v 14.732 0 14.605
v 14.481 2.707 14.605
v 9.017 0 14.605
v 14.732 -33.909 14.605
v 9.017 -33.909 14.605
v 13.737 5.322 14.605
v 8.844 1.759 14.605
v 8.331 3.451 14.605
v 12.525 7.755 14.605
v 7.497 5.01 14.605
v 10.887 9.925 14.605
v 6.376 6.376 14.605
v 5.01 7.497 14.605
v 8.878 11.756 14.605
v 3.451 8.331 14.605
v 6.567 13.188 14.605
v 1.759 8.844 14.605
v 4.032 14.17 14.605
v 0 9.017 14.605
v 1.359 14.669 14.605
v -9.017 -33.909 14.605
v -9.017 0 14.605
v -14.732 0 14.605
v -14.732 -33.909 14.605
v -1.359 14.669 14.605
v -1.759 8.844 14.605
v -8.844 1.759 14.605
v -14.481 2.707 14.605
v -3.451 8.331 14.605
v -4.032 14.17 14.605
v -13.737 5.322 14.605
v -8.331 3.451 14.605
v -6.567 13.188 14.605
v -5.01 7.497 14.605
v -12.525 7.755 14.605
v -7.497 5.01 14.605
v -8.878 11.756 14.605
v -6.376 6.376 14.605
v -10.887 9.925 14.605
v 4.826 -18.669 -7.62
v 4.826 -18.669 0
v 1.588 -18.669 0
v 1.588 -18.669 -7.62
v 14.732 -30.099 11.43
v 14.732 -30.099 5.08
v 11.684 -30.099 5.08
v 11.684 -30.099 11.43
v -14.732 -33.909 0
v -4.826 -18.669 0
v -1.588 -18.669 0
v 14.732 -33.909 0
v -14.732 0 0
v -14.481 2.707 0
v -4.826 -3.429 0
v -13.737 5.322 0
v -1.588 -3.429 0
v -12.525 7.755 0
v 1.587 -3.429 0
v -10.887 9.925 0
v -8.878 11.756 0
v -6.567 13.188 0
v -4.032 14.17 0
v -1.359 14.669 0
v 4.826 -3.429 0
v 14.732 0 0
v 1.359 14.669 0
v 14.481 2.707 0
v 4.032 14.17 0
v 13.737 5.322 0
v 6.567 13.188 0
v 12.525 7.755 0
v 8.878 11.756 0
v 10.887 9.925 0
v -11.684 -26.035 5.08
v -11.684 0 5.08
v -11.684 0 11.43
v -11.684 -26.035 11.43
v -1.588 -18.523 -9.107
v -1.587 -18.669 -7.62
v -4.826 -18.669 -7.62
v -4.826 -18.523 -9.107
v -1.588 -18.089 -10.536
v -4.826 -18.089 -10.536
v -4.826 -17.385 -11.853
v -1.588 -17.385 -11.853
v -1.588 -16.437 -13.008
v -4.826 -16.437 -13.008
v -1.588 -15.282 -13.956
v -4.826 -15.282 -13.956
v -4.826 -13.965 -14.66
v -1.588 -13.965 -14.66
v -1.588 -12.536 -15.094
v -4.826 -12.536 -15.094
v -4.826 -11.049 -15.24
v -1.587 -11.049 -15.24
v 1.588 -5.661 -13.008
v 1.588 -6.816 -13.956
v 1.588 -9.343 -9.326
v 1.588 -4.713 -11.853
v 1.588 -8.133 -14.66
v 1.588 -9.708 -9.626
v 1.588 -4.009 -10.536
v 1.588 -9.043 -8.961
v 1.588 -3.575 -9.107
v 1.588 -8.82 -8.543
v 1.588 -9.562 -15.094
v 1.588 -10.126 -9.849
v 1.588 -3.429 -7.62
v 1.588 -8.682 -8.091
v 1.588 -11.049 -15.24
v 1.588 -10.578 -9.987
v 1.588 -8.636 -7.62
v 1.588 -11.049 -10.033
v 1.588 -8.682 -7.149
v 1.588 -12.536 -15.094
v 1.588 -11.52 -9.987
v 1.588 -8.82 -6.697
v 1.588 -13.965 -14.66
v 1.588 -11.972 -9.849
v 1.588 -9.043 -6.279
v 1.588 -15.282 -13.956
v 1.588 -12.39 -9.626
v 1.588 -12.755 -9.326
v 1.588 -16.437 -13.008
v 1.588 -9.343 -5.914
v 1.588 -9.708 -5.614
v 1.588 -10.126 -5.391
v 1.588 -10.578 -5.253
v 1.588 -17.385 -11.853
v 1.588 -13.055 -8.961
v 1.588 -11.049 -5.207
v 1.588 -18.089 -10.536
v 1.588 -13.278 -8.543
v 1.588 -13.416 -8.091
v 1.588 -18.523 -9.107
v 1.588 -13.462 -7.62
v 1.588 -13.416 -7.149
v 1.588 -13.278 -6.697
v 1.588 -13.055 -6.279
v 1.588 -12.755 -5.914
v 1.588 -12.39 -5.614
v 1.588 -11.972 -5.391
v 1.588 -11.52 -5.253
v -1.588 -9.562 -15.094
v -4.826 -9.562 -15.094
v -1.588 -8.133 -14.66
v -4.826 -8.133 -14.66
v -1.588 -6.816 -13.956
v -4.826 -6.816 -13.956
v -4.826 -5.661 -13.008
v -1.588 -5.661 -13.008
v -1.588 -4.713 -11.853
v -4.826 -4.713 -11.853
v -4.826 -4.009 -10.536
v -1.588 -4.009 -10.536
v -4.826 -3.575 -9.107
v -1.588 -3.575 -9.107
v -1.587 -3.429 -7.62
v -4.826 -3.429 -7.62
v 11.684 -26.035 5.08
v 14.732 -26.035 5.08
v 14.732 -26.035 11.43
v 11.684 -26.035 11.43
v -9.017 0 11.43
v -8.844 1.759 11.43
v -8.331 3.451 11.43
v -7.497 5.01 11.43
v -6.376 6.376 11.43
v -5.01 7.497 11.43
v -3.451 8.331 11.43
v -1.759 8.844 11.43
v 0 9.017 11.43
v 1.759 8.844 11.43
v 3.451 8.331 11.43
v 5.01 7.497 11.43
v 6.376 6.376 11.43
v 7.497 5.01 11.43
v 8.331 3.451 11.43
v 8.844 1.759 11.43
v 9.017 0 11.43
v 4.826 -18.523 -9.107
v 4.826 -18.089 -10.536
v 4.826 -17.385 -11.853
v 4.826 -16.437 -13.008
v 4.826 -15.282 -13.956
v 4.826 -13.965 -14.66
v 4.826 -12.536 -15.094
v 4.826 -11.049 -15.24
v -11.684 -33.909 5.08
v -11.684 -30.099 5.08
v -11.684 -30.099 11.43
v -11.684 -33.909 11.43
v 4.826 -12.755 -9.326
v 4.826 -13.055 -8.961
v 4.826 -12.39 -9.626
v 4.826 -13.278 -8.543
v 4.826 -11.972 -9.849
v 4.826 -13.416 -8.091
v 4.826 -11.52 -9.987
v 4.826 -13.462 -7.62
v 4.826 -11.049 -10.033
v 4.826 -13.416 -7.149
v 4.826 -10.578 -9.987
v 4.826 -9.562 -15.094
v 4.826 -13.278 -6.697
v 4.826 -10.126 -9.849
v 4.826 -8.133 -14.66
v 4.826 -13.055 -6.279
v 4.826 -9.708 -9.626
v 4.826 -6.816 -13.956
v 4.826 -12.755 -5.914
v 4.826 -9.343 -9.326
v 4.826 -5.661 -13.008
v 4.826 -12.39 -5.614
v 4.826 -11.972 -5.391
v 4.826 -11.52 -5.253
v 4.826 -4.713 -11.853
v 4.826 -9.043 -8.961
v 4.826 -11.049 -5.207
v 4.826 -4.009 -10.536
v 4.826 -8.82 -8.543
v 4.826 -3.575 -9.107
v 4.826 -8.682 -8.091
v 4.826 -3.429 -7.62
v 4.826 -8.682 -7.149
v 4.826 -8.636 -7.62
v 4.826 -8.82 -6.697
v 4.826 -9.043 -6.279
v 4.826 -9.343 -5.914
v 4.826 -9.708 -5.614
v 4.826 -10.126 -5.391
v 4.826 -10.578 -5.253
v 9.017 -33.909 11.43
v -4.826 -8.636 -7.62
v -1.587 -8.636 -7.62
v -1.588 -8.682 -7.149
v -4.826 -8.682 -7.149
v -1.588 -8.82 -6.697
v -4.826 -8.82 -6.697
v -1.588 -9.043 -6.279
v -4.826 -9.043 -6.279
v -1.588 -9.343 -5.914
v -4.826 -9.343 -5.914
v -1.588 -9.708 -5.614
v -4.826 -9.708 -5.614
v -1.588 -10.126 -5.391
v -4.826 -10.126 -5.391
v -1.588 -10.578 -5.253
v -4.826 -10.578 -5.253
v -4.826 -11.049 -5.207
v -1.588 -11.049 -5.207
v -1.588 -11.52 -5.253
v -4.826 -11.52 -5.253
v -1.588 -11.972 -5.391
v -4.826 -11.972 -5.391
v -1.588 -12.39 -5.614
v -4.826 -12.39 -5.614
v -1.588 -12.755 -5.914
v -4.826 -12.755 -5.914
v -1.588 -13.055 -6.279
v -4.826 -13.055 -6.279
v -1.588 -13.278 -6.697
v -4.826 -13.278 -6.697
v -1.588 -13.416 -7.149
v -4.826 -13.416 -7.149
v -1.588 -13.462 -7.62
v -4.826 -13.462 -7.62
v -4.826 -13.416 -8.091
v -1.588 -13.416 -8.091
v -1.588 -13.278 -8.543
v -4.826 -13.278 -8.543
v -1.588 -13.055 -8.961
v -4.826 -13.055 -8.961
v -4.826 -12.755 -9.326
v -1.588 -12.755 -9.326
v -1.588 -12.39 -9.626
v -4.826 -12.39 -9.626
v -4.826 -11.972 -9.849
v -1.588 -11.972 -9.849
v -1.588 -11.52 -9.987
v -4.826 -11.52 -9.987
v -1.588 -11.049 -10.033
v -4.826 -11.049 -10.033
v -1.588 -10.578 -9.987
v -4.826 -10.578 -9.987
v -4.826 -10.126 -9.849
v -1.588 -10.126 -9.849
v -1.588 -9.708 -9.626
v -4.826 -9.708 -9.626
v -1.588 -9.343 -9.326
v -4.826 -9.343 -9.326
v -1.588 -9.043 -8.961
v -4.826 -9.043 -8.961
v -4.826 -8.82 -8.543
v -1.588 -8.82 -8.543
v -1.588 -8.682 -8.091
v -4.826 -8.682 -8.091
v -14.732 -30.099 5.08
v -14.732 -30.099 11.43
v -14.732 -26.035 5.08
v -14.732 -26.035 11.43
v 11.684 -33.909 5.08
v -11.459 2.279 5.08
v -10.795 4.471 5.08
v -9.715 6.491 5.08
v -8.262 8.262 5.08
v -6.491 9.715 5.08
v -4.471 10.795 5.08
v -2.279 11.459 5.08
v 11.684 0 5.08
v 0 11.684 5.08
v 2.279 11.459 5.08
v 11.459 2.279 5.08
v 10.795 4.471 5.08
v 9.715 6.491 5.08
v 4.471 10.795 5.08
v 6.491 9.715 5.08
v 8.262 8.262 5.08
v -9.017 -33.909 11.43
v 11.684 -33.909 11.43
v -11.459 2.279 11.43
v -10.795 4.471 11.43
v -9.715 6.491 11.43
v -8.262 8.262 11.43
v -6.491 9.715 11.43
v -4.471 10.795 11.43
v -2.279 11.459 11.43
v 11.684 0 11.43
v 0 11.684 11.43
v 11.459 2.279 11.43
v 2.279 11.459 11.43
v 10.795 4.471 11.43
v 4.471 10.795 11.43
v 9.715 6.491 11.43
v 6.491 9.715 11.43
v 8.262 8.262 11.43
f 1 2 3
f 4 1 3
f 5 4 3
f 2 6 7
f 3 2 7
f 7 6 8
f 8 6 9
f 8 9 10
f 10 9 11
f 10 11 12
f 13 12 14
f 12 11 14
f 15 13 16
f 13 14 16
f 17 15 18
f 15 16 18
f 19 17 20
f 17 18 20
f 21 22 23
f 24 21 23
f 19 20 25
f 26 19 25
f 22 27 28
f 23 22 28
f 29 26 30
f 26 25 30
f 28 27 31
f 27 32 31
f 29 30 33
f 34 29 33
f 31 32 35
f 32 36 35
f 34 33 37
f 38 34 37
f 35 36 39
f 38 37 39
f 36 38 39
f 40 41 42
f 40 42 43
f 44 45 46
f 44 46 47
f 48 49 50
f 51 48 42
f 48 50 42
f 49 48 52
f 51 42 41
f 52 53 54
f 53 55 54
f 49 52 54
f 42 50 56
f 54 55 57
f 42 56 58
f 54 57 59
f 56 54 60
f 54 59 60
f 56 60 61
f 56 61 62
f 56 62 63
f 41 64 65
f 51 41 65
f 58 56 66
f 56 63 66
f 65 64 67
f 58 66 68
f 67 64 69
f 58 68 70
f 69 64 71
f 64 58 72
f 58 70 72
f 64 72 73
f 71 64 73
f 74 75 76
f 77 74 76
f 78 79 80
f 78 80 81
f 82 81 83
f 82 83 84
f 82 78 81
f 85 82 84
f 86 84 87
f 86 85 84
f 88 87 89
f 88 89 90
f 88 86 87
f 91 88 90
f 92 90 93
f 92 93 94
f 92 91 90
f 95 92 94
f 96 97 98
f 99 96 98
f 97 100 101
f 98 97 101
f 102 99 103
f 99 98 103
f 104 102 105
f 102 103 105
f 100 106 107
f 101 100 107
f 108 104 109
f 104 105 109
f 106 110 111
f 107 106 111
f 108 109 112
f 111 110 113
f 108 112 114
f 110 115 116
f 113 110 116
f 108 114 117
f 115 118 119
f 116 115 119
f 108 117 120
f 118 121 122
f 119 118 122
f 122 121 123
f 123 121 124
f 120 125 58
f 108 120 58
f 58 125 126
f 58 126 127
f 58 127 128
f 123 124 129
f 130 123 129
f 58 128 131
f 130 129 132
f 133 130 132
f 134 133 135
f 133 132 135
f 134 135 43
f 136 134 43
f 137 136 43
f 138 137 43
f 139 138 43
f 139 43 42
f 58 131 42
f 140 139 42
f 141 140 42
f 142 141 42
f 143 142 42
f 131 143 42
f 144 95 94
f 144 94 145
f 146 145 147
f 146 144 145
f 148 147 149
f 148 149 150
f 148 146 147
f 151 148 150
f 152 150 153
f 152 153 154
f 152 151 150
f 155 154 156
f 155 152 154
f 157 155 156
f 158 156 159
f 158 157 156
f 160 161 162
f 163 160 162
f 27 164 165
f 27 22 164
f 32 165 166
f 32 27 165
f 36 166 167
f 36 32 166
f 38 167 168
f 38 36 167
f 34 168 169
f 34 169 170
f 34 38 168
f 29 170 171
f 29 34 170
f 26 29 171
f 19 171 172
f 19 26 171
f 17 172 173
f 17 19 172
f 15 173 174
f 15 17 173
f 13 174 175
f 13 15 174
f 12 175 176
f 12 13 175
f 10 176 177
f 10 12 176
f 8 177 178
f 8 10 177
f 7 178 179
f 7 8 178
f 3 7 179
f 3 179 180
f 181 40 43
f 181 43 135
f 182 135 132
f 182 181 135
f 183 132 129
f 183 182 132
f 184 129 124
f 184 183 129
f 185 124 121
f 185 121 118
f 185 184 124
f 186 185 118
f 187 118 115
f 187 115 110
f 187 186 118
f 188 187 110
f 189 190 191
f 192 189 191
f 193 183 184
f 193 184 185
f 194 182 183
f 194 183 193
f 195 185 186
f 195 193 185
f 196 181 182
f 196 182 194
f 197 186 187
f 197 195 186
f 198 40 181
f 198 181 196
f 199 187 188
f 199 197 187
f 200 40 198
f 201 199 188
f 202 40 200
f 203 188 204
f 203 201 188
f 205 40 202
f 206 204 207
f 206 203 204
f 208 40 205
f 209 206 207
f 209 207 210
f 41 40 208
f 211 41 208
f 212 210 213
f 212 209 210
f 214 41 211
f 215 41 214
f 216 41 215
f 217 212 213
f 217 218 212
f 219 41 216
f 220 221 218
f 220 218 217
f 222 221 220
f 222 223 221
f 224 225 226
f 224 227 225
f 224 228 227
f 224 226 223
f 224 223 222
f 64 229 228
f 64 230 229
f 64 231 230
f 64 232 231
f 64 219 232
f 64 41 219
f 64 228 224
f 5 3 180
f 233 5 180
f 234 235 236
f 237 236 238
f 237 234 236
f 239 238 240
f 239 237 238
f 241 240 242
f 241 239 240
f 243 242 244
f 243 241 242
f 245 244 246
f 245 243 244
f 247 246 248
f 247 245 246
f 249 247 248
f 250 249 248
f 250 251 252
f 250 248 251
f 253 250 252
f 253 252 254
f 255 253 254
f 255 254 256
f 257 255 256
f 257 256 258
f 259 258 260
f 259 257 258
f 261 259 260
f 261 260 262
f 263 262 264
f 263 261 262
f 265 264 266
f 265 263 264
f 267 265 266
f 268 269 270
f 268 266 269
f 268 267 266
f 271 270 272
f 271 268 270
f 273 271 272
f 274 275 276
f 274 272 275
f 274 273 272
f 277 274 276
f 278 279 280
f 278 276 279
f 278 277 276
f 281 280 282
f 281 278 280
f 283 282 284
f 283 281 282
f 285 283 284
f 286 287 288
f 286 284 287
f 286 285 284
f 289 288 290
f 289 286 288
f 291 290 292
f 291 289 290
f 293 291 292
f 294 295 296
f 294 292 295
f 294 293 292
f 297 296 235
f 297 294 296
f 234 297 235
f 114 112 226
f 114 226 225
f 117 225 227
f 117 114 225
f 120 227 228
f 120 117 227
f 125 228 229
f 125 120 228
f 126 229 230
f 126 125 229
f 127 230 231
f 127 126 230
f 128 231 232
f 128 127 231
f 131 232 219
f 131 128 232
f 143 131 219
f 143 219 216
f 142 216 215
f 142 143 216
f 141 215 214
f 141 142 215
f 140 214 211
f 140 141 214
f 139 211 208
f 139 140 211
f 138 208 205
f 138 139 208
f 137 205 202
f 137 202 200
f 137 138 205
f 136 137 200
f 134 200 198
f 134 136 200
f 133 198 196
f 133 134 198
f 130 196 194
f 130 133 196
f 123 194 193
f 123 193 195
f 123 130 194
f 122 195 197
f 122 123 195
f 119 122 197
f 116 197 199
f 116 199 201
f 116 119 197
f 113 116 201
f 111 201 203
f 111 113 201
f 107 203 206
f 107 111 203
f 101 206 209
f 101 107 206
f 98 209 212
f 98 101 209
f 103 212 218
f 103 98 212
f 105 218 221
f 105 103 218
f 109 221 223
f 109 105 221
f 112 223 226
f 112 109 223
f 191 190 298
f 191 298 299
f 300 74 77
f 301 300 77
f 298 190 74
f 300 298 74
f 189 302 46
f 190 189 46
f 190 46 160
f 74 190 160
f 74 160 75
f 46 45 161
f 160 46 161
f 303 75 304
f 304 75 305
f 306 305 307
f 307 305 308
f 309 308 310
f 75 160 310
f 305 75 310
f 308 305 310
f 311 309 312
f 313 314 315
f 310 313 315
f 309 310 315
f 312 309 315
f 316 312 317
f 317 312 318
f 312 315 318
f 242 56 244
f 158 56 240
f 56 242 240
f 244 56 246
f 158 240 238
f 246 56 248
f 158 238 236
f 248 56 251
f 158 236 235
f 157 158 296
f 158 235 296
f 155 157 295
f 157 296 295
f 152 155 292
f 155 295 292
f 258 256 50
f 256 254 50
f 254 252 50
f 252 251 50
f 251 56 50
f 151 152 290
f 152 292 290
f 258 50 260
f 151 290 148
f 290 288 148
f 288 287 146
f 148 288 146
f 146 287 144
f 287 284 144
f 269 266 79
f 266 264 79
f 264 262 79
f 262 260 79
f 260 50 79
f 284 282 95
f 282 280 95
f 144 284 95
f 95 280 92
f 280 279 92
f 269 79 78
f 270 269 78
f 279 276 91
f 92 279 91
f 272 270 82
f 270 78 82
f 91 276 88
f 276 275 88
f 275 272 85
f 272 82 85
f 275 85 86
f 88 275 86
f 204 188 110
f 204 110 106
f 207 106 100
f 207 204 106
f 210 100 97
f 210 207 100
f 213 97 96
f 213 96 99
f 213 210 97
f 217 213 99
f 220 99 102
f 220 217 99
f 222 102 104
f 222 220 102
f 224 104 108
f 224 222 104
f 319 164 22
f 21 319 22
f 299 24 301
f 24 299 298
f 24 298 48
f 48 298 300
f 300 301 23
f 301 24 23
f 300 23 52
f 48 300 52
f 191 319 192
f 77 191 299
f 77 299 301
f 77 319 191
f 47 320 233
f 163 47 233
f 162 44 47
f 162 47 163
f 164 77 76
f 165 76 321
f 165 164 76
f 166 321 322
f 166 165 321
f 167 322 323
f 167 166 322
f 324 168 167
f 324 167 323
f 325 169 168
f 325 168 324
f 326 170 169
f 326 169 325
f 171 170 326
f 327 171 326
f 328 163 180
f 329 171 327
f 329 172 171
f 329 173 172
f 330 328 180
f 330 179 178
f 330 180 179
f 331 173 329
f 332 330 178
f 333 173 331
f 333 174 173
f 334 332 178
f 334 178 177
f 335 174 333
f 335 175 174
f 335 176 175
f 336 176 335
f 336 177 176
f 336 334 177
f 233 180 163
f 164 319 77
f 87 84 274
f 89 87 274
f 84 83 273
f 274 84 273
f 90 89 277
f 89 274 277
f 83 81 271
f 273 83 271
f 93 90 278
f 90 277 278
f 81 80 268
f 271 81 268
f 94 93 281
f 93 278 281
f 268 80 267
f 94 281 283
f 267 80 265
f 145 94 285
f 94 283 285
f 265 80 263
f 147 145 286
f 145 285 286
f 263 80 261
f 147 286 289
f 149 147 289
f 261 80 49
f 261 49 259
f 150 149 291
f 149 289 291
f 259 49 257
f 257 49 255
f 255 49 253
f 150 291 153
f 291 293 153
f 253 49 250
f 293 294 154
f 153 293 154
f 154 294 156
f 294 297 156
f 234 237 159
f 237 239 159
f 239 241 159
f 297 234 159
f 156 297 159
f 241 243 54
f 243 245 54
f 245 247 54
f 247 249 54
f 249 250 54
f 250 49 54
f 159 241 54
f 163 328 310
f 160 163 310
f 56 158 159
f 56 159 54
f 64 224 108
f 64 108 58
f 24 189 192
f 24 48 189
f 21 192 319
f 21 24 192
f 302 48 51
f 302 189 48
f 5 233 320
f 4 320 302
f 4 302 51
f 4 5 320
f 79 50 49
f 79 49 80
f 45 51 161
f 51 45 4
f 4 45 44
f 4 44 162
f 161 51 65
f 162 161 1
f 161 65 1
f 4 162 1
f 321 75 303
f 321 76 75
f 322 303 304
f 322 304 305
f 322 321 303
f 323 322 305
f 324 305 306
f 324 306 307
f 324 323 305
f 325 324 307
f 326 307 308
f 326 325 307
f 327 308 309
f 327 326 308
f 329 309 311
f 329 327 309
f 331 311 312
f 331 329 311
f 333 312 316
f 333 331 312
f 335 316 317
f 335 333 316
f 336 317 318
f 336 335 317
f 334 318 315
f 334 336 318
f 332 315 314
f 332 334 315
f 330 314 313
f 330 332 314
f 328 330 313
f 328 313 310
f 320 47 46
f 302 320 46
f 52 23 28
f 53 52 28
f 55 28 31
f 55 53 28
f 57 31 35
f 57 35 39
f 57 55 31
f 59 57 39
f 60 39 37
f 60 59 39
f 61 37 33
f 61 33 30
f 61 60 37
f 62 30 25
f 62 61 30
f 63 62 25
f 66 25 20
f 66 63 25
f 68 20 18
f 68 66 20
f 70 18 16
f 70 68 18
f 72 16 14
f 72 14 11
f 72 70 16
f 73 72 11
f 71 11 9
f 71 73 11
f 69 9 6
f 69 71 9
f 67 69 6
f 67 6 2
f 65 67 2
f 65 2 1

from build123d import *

# Parameters (mm, degrees)
F1_ANGLE = 180
F2_DEPTH = 33.909
F3_W     = 4.064
F3_H     = 6.35
F4_DEPTH = 29.465
F5_R     = 2.413
F6_DEPTH = 4.826
F8_DEPTH = 25.4


with BuildPart() as f1:
    # F0 (on Front) → F1 (revolve)
    with BuildSketch(Plane.XZ):
        Polygon((-14.732, 0), (0, 0), (0, 5.08), (-11.684, 5.08), (-11.684, 11.43), (-9.017, 11.43), (-9.017, 14.605), (-14.732, 14.605), align=None)
    revolve(axis=Axis((0, 0, 6.597309), (0, 0, -1)), revolution_arc=F1_ANGLE)

    # F1_face (on face) → F2 (join)
    with BuildSketch(Plane(origin=(0, 0, 5.216983), x_dir=(1, 0, 0), z_dir=(0, -1, 0))):
        Polygon((-14.732, -5.216983), (14.732, -5.216983), (14.732, 9.388017), (9.017, 9.388017), (9.017, 6.213017), (11.684, 6.213017), (11.684, -0.136983), (-11.684, -0.136983), (-11.684, 6.213017), (-9.017, 6.213017), (-9.017, 9.388017), (-14.732, 9.388017), align=None)
    extrude(amount=F2_DEPTH)

    # F3 (on face) → F4 (cut, through all)
    with BuildSketch(Plane.YZ.offset(14.732)):
        with Locations((-28.067, 8.255)):
            Rectangle(F3_W, F3_H)
    extrude(amount=-F4_DEPTH, mode=Mode.SUBTRACT)

    # F5 (on Right) → F6 (join, symmetric)
    with BuildSketch(Plane.YZ):
        with BuildLine():
            Line((-3.429, -7.62), (-3.429, 0))
            Line((-3.429, 0), (-18.669, 0))
            Line((-18.669, 0), (-18.669, -7.62))
            ThreePointArc((-18.669, -7.62), (-16.437154, -13.008154), (-11.049, -15.24))
            ThreePointArc((-11.049, -15.24), (-5.660846, -13.008154), (-3.429, -7.62))
        make_face()
        with Locations((-11.049, -7.62)):
            Circle(F5_R, mode=Mode.SUBTRACT)
    extrude(amount=F6_DEPTH, both=True)

    # F7 (on face) → F8 (cut)
    with BuildSketch(Plane.XZ.offset(18.669)):
        Polygon((1.5875, 0), (-1.5875, 0), (-1.5875, -7.62), (0, -7.62), (1.5875, -7.62), align=None)
        Polygon((0, -7.62), (-1.5875, -7.62), (-1.5875, -17.78), (1.5875, -17.78), (1.5875, -7.62), align=None)
    extrude(amount=-F8_DEPTH, mode=Mode.SUBTRACT)


solid = f1.part
